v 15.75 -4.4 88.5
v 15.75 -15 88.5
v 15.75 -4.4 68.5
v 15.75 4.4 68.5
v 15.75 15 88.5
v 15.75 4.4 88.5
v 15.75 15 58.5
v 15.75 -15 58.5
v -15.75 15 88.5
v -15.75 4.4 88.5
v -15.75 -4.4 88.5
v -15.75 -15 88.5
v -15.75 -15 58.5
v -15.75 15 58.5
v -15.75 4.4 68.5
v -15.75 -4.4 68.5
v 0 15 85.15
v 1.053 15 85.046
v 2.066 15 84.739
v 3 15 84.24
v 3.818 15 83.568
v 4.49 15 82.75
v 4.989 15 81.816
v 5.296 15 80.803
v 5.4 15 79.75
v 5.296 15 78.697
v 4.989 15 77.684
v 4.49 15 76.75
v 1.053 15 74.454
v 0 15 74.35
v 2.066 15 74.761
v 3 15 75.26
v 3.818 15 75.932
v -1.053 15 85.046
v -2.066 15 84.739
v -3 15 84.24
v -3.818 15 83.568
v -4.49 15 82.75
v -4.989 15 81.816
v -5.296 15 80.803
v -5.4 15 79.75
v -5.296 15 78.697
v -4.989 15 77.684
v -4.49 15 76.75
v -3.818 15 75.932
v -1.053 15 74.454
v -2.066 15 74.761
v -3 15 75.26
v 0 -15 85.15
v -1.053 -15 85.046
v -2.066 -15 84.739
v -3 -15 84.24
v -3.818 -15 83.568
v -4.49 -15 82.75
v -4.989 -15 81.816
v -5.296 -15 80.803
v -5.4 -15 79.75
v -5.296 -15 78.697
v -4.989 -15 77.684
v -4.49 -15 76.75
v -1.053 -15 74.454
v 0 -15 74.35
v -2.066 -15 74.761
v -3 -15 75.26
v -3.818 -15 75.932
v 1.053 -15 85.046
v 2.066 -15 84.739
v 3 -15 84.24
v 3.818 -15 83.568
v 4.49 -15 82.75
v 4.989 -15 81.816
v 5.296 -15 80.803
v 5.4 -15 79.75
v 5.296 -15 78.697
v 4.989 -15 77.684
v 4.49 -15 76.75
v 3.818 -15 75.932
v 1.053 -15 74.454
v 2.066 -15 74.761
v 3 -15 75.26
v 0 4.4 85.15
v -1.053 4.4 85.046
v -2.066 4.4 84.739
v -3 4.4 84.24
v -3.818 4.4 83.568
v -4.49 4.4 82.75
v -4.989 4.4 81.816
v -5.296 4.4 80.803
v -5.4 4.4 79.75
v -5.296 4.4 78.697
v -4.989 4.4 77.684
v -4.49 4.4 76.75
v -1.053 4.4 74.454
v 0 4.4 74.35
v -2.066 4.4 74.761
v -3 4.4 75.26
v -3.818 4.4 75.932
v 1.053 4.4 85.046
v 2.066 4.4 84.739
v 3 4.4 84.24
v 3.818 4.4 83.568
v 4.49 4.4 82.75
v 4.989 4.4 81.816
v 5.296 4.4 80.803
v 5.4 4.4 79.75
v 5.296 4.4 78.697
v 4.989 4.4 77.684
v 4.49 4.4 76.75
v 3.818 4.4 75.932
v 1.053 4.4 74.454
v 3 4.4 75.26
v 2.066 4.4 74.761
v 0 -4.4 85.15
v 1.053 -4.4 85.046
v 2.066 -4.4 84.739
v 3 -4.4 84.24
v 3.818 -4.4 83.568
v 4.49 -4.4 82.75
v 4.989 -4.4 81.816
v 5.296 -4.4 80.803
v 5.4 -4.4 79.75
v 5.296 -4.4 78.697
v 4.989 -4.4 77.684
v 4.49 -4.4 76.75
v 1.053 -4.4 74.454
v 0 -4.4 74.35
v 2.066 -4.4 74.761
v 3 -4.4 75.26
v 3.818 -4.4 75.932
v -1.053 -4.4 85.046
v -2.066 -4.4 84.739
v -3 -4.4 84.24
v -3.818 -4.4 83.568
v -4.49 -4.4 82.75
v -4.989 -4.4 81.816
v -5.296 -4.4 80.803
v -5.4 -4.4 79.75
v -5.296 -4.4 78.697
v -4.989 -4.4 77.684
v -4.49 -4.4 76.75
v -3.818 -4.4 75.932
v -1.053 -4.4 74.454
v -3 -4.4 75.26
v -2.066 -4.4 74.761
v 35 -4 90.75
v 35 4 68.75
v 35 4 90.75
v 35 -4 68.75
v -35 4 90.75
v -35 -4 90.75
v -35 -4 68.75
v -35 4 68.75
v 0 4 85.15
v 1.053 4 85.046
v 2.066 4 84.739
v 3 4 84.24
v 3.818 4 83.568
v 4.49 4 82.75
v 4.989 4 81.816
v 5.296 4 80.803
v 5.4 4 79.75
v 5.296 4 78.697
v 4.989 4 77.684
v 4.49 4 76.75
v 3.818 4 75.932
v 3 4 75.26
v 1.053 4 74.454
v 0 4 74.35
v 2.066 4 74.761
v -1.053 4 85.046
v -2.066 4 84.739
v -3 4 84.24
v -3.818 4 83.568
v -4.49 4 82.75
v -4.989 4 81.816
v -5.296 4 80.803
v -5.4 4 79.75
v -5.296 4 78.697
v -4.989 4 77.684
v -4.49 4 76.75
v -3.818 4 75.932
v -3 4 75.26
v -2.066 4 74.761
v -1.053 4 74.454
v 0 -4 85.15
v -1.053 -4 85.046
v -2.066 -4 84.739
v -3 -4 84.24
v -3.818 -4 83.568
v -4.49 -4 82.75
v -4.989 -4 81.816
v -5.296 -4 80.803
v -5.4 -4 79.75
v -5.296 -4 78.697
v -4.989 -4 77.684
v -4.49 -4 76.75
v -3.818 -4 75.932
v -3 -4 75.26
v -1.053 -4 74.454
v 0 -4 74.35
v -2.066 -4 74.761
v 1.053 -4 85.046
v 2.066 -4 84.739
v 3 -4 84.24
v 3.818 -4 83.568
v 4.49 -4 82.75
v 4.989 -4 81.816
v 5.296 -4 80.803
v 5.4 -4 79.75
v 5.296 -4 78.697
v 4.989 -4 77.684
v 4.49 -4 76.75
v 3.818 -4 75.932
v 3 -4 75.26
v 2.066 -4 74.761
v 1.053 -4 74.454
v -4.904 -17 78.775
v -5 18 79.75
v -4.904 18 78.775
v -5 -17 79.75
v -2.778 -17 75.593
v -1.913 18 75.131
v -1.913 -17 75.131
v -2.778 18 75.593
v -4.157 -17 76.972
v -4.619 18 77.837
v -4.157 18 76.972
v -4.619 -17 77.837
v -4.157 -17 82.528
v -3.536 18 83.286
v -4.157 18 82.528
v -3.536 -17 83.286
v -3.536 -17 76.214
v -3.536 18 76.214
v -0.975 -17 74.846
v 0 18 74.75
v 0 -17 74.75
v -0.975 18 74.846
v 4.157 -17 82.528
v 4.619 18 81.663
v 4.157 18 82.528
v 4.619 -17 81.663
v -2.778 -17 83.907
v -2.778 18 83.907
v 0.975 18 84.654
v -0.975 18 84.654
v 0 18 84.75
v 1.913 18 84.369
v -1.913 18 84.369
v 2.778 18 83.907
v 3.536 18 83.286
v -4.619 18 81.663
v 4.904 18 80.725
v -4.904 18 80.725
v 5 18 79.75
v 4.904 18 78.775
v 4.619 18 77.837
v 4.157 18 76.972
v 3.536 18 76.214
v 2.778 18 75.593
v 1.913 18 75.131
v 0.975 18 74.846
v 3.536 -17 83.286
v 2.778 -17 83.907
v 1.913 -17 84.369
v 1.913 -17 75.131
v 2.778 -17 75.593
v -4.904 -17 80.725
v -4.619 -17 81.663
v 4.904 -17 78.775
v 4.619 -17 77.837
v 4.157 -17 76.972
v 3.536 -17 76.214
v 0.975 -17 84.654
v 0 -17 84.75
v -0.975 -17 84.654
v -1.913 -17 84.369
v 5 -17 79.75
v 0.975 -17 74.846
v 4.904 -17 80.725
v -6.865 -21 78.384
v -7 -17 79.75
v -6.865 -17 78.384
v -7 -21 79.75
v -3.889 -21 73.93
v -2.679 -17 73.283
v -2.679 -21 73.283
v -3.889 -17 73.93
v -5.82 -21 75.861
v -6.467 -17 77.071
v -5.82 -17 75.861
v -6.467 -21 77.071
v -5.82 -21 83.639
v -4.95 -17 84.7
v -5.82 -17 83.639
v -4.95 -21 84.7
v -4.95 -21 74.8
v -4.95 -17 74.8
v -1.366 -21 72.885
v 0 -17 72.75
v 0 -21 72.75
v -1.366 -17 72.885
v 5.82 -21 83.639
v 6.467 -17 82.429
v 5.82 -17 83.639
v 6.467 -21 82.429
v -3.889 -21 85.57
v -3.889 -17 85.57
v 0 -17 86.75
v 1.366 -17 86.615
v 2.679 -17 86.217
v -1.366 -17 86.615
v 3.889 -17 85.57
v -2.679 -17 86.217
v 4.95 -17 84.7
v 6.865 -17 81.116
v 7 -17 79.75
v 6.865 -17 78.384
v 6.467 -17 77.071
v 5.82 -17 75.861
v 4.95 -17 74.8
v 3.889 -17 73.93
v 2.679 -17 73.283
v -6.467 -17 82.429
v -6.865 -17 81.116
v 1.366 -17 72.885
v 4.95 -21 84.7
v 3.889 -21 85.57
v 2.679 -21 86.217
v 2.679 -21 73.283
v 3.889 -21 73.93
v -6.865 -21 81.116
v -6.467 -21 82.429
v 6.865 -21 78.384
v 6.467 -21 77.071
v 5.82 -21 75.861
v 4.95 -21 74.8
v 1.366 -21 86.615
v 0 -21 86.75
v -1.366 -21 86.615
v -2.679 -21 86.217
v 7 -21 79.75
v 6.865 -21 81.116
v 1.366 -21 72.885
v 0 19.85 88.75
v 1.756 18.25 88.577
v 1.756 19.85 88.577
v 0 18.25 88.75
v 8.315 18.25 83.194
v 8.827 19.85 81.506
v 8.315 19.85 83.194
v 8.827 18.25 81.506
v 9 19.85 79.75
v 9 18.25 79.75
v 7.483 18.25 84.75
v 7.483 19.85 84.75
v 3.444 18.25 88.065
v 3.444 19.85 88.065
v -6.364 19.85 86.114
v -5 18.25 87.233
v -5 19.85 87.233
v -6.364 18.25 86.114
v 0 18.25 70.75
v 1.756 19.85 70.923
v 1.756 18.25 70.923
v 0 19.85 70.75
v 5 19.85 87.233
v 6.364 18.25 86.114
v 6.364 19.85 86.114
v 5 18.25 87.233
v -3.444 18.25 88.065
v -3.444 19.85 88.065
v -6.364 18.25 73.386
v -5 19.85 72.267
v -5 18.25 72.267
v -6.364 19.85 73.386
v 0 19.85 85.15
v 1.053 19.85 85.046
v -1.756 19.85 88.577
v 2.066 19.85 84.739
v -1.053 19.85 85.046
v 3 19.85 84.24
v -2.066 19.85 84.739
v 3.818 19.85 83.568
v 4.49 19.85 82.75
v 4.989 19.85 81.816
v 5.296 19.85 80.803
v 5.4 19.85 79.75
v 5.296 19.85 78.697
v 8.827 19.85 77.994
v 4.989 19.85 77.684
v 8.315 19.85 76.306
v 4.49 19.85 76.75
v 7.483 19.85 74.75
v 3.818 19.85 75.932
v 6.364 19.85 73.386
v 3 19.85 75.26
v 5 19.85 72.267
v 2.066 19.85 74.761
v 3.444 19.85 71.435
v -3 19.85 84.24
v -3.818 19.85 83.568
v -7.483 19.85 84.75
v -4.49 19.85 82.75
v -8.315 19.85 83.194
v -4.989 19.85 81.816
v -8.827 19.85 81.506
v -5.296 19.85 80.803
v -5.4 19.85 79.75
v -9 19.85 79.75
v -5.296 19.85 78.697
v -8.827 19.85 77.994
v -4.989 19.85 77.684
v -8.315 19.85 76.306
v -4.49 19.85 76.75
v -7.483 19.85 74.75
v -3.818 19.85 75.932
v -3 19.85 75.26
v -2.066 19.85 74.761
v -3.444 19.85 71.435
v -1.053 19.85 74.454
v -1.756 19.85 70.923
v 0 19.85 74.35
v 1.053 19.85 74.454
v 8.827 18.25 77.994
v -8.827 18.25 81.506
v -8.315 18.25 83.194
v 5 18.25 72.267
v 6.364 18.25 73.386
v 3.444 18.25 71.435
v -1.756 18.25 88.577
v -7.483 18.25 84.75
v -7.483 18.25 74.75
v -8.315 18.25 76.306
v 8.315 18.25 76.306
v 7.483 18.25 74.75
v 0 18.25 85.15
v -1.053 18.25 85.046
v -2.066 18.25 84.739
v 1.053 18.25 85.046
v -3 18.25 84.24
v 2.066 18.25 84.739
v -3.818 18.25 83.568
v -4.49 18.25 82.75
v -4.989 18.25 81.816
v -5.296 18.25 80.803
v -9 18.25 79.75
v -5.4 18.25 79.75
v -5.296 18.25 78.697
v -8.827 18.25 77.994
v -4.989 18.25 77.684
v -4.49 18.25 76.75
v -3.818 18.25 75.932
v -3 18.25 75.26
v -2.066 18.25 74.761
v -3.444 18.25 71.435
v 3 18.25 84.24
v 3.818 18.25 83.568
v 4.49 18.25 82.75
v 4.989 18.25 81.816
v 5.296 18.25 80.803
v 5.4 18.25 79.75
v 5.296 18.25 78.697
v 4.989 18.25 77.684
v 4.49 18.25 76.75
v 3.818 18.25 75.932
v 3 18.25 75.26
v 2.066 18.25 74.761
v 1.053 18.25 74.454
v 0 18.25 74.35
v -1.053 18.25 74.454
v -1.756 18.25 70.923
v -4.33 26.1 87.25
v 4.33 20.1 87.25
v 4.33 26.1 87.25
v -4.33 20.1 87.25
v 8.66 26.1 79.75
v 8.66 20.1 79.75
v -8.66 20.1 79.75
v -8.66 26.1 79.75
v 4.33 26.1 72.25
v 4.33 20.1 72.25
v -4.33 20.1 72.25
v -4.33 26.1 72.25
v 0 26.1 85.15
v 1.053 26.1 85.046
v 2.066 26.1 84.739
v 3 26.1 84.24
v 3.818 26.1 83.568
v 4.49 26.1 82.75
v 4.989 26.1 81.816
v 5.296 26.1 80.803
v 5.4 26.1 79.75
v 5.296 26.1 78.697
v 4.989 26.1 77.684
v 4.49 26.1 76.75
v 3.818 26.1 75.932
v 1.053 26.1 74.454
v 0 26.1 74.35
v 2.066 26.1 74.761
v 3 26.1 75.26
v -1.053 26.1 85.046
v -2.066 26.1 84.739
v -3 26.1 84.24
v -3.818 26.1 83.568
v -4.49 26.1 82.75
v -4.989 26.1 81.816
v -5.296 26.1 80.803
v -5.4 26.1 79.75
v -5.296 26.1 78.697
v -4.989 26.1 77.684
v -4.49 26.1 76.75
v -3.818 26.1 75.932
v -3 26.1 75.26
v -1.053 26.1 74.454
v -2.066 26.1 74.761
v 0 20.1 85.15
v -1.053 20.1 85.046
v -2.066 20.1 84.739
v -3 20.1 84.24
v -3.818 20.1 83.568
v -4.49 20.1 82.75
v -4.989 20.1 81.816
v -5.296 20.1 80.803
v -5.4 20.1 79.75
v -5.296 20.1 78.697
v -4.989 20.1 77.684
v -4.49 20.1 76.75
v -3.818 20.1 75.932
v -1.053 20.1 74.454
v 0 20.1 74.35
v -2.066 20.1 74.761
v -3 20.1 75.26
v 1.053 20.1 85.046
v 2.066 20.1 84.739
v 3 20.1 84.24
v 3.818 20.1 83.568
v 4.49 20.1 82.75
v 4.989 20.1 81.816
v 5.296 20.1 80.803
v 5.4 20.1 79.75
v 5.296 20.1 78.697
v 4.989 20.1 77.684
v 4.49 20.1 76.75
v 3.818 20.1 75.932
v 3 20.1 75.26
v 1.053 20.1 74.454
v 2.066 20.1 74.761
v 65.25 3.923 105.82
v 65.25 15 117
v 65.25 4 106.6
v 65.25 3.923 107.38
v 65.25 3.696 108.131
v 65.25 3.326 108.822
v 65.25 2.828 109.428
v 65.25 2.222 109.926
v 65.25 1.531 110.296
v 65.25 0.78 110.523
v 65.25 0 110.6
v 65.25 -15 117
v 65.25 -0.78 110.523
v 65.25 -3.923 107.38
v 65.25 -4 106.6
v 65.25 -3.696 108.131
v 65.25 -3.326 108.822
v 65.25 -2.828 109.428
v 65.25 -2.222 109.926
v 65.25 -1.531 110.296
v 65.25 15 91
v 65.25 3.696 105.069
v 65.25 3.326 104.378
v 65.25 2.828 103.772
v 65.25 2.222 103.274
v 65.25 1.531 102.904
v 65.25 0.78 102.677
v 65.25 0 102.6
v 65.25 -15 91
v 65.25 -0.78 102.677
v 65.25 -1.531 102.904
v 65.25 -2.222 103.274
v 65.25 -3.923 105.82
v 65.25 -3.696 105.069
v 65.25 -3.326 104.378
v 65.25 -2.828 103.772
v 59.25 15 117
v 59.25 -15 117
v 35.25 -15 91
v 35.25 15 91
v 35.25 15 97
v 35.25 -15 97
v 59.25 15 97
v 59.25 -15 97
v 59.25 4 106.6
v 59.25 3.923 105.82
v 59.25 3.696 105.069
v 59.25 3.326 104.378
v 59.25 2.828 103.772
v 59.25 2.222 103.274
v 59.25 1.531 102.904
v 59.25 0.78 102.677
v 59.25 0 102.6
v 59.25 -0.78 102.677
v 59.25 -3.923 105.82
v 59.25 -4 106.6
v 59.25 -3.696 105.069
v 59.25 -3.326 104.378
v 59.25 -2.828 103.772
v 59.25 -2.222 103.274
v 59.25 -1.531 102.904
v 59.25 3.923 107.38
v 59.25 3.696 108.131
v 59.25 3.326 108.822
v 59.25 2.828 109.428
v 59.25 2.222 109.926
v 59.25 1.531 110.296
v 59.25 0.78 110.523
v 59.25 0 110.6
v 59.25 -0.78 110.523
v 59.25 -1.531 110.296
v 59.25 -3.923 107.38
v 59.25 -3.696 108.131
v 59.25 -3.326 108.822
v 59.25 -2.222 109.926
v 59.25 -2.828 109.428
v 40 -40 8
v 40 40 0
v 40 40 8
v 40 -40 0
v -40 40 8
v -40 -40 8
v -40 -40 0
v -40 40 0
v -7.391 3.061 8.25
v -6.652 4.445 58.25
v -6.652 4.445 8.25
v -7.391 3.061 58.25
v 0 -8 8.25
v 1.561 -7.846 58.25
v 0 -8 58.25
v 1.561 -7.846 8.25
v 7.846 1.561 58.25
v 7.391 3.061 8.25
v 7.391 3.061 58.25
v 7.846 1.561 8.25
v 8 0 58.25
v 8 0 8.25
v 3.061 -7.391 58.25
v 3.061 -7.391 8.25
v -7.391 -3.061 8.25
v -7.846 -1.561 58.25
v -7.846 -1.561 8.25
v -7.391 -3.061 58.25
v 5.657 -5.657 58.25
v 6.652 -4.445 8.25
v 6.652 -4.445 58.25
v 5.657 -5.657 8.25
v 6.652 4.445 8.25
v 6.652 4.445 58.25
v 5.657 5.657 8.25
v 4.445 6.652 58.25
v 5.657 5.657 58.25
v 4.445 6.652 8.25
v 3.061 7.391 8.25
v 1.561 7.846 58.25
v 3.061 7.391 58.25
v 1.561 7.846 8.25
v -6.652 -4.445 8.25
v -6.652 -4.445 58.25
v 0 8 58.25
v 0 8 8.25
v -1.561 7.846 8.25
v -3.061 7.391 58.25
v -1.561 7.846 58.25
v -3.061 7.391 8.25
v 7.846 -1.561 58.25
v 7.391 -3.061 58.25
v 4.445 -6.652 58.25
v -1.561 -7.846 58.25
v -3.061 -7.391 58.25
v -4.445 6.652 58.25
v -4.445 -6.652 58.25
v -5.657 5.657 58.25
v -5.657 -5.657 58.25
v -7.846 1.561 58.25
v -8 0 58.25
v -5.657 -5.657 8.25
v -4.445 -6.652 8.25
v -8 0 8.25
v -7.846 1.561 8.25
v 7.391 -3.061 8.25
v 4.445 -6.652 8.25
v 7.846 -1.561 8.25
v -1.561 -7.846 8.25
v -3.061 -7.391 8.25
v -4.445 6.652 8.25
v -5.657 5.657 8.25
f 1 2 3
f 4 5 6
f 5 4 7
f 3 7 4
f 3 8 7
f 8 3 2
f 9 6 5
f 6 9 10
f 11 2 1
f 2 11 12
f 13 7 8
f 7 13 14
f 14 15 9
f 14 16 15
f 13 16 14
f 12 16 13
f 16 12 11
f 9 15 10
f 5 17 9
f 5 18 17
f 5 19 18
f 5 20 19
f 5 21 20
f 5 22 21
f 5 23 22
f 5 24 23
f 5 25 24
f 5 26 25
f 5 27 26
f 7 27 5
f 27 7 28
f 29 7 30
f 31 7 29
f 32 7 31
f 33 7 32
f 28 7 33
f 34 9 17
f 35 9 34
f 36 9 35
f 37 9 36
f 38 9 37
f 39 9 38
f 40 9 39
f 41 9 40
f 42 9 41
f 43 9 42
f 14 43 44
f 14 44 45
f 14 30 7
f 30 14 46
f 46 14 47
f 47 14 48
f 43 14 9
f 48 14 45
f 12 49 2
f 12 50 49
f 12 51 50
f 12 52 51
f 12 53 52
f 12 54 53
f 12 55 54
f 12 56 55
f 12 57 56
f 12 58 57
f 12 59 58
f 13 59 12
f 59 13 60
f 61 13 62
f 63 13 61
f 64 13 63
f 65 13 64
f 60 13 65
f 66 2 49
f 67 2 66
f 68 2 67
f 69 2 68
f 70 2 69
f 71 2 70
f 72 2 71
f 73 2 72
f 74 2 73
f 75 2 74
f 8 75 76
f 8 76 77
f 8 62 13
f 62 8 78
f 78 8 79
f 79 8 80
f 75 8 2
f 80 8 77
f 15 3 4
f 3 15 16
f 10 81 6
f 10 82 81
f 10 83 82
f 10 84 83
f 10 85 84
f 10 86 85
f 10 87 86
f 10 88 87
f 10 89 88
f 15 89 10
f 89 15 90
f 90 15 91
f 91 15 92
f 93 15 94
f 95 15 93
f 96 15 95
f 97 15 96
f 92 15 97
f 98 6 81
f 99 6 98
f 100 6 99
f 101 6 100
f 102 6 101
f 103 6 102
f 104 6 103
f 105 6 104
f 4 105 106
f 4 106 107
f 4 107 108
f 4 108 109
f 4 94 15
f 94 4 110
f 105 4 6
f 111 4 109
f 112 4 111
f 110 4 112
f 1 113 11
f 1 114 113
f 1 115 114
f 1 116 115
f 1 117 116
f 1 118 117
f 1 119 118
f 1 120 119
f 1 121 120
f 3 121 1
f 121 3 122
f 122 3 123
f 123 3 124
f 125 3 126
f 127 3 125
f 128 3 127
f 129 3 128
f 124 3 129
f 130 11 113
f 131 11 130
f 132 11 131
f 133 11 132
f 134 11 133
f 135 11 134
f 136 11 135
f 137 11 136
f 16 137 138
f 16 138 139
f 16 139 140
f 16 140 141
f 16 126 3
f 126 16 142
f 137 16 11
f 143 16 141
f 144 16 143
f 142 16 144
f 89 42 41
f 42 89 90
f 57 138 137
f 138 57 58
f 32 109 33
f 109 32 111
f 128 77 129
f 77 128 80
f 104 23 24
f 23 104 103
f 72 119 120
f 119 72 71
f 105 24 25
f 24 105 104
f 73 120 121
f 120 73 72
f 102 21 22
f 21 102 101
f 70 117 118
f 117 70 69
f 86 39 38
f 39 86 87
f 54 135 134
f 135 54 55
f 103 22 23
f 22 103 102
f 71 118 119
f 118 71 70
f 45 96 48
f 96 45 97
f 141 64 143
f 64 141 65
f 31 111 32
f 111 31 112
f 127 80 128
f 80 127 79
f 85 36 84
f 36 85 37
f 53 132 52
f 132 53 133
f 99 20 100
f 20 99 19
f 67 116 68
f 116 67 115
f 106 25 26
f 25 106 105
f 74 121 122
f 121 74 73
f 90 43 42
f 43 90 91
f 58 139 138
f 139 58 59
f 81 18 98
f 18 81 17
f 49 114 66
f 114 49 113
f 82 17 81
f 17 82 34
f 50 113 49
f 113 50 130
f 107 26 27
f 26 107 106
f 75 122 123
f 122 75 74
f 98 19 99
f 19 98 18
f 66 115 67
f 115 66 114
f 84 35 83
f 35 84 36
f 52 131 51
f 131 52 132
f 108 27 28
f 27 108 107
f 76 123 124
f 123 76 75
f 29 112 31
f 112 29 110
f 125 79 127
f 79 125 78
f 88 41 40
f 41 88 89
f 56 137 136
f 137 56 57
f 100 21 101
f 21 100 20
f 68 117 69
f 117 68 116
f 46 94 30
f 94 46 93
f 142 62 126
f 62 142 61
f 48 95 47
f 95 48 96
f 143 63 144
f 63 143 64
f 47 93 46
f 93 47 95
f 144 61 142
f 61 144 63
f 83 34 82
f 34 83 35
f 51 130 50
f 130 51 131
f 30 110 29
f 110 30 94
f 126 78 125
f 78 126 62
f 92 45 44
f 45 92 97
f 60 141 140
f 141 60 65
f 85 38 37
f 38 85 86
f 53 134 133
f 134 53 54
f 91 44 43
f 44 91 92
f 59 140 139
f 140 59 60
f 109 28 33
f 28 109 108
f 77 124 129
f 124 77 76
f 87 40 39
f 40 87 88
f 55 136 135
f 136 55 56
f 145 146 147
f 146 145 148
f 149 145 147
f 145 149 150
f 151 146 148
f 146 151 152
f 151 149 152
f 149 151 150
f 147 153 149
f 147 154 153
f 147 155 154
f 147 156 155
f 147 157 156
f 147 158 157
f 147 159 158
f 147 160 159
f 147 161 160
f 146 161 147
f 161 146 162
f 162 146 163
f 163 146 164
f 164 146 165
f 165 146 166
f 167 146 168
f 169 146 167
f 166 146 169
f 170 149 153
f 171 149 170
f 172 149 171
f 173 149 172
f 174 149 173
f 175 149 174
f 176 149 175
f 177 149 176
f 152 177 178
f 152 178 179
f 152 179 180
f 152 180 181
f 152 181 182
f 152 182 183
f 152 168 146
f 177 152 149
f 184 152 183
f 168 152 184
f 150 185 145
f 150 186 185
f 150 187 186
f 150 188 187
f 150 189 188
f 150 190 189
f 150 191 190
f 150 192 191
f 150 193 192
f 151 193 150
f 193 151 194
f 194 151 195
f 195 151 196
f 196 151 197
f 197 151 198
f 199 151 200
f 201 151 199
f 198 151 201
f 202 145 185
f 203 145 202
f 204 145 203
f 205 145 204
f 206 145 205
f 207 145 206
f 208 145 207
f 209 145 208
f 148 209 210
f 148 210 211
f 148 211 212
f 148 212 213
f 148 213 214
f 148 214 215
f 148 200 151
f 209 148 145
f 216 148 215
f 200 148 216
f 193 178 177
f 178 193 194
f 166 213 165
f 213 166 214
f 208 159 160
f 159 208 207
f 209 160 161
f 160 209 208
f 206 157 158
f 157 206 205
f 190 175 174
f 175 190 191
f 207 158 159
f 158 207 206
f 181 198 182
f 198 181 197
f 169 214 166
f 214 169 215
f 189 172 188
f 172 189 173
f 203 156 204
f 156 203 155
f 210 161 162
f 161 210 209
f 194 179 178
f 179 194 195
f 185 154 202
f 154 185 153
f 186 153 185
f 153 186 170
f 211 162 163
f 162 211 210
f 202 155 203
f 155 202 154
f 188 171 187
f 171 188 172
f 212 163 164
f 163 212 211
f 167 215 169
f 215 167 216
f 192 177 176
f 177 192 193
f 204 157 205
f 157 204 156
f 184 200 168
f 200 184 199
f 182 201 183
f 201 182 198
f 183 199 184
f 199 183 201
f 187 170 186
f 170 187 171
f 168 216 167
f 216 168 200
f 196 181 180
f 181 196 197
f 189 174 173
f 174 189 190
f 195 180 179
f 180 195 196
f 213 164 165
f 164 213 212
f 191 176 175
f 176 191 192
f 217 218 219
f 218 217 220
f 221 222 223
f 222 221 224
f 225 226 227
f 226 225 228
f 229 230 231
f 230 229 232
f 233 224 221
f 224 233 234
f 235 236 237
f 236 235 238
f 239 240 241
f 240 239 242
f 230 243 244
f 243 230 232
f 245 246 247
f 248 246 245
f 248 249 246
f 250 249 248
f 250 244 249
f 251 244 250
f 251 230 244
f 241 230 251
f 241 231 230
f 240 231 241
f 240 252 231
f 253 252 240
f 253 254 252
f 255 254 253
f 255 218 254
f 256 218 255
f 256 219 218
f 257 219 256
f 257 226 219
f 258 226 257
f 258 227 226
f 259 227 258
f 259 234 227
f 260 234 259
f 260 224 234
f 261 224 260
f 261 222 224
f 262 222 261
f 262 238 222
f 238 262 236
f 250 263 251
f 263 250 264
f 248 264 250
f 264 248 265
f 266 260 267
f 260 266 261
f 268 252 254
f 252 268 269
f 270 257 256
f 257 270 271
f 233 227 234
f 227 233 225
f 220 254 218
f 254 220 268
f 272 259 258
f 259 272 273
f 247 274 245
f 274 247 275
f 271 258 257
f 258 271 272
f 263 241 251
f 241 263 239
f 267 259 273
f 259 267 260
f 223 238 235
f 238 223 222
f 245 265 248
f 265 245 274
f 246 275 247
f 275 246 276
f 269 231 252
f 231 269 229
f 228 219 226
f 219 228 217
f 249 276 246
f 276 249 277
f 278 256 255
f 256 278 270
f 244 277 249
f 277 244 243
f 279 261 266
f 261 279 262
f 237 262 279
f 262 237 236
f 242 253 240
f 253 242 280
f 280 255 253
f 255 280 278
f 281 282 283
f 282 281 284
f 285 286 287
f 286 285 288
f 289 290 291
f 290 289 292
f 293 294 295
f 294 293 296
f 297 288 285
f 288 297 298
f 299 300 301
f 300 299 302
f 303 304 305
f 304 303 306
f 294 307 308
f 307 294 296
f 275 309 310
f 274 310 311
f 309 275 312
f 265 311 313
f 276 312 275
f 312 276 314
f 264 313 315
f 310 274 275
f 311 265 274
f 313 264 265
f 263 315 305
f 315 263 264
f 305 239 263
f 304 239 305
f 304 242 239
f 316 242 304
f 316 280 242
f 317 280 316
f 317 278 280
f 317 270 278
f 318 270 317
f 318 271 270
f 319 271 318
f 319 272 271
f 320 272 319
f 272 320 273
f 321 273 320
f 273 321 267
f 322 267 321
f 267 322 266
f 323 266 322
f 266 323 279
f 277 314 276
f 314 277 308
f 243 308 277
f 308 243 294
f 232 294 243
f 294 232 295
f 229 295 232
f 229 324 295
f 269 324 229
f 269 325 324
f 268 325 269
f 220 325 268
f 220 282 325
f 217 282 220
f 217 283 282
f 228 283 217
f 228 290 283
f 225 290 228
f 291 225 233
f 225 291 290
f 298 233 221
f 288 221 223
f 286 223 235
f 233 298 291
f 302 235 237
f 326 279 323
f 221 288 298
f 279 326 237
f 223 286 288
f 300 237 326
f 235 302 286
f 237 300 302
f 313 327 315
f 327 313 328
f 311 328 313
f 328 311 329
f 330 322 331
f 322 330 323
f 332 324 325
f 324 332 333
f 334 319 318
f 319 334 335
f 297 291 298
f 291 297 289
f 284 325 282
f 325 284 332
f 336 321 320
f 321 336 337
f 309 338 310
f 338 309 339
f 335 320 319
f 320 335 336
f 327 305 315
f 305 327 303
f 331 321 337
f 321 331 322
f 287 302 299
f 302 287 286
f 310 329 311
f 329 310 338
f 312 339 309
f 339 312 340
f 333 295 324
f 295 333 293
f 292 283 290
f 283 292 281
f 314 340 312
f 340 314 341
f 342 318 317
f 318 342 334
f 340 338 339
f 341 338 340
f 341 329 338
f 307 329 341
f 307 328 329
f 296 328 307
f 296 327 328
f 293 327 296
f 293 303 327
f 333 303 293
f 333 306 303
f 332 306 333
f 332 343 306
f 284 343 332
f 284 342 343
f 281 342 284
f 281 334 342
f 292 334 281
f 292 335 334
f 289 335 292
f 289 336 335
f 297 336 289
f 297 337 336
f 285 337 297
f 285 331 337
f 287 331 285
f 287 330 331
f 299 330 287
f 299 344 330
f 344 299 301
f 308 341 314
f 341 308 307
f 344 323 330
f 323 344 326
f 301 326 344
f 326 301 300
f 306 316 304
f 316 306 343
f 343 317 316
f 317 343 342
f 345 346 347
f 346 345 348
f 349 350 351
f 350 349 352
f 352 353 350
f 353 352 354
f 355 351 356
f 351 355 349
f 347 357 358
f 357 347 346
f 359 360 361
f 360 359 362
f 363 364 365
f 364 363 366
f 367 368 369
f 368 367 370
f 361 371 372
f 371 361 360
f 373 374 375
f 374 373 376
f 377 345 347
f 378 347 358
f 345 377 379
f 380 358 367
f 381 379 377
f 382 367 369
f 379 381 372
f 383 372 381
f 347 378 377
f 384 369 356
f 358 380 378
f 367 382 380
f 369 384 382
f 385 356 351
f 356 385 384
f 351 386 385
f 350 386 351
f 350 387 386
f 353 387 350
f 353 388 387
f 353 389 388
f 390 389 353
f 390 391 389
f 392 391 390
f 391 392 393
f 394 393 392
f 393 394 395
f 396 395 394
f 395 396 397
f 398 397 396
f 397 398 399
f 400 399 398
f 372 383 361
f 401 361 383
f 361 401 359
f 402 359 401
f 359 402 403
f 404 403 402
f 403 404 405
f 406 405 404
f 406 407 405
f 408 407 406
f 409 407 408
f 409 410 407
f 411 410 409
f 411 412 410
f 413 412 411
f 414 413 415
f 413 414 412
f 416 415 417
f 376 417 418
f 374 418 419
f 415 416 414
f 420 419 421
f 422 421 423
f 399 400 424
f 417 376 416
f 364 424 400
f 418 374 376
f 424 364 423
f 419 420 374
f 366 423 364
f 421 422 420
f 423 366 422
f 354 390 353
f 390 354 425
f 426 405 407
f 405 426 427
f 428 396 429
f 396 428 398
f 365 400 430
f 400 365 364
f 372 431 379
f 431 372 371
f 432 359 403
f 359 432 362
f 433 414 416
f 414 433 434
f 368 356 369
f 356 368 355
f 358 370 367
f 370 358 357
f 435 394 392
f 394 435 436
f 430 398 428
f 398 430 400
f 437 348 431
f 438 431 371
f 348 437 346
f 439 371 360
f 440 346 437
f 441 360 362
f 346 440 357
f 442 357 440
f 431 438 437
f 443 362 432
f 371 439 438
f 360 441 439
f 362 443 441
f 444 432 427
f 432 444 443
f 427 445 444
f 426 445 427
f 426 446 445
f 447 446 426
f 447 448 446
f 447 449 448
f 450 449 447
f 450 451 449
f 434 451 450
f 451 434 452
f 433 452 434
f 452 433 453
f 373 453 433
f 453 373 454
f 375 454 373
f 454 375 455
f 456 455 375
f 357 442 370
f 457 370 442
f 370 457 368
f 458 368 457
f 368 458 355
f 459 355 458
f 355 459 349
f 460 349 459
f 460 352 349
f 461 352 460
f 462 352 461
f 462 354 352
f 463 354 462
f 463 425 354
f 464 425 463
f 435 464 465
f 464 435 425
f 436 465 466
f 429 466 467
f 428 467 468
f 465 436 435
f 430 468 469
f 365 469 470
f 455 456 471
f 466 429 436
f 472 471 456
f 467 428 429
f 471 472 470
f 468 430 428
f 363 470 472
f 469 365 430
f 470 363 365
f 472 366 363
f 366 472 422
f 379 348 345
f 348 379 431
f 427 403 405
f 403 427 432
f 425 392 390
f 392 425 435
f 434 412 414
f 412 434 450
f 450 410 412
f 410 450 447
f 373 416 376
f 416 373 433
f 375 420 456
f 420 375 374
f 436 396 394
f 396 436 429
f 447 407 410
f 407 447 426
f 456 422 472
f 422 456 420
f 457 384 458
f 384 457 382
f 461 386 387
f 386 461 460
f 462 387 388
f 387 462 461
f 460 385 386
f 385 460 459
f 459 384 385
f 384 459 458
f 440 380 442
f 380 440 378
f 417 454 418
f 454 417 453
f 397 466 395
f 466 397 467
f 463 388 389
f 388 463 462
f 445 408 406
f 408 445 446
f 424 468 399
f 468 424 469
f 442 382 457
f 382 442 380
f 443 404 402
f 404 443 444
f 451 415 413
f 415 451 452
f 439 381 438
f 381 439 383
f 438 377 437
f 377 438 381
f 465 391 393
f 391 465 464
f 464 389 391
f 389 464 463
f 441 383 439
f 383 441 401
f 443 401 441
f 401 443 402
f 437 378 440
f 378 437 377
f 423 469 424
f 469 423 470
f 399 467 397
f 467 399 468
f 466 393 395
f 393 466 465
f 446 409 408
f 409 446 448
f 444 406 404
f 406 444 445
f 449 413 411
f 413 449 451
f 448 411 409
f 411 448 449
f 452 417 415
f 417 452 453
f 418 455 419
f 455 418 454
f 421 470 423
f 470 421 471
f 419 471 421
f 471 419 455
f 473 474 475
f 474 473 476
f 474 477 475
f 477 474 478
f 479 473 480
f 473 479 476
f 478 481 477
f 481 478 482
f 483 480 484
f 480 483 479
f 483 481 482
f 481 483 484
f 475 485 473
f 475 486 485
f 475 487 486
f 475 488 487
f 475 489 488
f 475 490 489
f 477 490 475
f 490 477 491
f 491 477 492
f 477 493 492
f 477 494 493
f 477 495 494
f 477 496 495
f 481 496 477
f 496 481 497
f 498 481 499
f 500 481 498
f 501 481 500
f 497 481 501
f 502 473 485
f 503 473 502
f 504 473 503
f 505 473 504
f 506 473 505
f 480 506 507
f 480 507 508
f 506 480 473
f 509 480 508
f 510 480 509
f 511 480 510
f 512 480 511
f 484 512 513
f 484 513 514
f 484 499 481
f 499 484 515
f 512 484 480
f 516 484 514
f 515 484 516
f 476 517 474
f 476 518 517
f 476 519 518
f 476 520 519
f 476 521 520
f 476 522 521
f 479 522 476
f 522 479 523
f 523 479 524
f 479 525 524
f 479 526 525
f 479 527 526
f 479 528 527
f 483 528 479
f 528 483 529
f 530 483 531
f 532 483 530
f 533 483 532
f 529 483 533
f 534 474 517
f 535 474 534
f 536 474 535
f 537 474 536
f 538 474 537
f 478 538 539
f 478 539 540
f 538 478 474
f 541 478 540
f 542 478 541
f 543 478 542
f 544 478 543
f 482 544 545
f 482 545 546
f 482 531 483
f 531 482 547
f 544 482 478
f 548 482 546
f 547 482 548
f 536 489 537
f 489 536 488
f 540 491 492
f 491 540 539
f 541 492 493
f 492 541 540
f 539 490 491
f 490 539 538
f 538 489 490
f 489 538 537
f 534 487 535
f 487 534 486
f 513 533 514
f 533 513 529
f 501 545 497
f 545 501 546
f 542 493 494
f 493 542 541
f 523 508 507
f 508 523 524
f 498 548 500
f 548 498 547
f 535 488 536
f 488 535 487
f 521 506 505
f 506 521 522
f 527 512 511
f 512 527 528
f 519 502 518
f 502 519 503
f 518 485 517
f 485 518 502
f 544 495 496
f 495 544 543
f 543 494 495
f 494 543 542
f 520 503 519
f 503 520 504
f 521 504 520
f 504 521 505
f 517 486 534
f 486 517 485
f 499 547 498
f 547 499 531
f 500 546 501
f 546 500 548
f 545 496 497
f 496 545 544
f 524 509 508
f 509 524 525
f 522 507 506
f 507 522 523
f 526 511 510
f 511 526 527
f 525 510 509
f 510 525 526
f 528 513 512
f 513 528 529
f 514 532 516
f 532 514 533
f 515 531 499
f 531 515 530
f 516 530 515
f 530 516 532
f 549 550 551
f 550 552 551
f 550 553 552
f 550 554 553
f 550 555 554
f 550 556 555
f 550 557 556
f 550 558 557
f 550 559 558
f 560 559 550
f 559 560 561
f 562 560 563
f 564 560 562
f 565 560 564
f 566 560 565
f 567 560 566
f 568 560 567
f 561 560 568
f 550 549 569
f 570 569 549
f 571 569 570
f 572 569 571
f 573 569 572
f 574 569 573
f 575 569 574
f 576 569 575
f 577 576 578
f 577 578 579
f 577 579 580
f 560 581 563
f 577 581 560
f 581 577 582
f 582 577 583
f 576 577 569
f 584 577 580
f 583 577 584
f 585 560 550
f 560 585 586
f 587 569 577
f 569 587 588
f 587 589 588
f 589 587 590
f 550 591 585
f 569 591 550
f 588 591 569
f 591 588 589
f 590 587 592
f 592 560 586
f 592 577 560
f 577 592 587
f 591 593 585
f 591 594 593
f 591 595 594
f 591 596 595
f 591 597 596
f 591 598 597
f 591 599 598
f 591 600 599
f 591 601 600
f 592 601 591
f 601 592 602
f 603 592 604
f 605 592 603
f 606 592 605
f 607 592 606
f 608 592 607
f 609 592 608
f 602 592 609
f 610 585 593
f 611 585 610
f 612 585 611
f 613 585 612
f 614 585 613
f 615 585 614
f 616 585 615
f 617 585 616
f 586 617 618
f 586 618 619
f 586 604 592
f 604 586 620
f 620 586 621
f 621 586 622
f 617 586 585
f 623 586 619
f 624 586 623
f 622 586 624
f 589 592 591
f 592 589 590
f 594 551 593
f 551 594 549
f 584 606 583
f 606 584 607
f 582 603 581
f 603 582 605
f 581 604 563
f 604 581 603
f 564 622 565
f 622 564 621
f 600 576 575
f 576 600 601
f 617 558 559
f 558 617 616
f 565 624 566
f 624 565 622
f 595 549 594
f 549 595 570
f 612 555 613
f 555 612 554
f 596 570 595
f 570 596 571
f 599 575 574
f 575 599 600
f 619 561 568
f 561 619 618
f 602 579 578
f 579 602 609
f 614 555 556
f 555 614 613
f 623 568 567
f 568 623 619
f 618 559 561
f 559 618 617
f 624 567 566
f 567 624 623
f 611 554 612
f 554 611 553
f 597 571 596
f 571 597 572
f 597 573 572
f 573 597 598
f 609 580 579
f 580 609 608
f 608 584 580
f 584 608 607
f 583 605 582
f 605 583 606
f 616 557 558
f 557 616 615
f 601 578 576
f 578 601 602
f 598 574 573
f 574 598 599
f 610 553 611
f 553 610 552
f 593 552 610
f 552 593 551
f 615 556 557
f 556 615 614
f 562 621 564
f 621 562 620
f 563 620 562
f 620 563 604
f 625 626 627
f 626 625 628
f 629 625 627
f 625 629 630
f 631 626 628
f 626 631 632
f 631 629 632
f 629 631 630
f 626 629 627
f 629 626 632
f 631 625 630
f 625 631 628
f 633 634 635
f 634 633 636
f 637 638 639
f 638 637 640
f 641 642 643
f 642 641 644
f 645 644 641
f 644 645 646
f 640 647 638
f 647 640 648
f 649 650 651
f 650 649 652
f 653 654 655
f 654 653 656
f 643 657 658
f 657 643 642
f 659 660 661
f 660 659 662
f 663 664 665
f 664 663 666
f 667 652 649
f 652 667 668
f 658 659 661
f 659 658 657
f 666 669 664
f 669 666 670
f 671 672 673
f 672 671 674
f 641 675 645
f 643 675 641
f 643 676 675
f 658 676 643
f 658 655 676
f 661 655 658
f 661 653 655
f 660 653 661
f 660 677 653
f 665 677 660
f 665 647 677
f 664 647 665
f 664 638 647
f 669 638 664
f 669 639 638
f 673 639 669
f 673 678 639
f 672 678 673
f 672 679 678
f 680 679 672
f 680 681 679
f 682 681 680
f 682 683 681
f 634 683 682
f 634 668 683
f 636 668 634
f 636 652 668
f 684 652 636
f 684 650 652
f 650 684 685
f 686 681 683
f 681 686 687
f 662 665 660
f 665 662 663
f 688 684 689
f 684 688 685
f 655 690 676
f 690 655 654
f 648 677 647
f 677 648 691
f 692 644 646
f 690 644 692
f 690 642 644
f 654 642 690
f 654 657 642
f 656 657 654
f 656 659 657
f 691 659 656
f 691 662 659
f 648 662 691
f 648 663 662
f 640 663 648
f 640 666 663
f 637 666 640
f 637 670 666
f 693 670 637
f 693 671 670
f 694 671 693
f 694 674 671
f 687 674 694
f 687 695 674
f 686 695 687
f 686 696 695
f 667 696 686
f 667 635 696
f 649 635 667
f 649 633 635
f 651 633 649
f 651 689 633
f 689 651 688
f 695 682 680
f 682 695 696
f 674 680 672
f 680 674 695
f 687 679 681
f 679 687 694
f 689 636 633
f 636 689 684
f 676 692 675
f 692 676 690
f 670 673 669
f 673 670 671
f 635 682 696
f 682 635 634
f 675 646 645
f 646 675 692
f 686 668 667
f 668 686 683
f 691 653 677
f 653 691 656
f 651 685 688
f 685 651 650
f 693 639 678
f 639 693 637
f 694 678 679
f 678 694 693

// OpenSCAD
$fn = 32;

// ------------------------------------------------------------------------
// Lamp arm: column d16 x 50 mm, arm 70 mm
// Every part is its own module, assembly() places every instance.
// ------------------------------------------------------------------------

// --- part 1 ---
module lamp_base() {
  difference() {
    translate([-40, -40, 0]) cube([80, 80, 8]);
  }
}

// --- part 2 ---
module lamp_column() {
  cylinder(h = 50, d = 16);
}

// --- part 3 ---
module head_fork() {
  difference() {
    translate([-15.75, -15, 0]) cube([31.5, 30, 30]);
    translate([-16.75, -4.4, 10]) cube([33.5, 8.8, 21]);
    translate([0, 0, 21.25]) rotate([90, 0, 0]) cylinder(h = 32, d = 10.8, center = true);
  }
}

// --- part 4 ---
module lamp_arm() {
  difference() {
    translate([-35, -4, 0]) cube([70, 8, 22]);
    translate([0, 0, 11]) rotate([90, 0, 0]) cylinder(h = 10, d = 10.8, center = true);
  }
}

// --- part 5 ---
module arm_pin() {
  rotate([0, 90, 0]) cylinder(h = 36, d = 10, center = true);
  translate([-21, 0, 0]) rotate([0, 90, 0]) cylinder(h = 4, d = 14);
}

// --- part 6 ---
module arm_washer() {
  difference() {
      translate([0, 0, 0]) cylinder(h = 1.6, d = 18);
      translate([0, 0, -1]) cylinder(h = 3.6, d = 10.8);
    }
}

// --- part 7 ---
module arm_nut() {
  difference() {
    linear_extrude(height = 6) polygon(points = [[8.66, 0], [4.33, 7.5], [-4.33, 7.5], [-8.66, 0], [-4.33, -7.5], [4.33, -7.5]]);
    translate([0, 0, -1]) cylinder(h = 8, d = 10.8);
  }
}

// --- part 8 ---
module shade_bracket() {
  difference() {
    translate([-15, -15, 0]) cube([30, 30, 26]);
    translate([-16, -16, 6]) cube([25, 32, 21]);
    translate([12, 0, 15.6]) rotate([0, 90, 0]) cylinder(h = 8, d = 8, center = true);
  }
}

// --- assembly ---
module assembly() {
  color([0.80, 0.24, 0.20]) translate([0, 0, 0]) rotate([0, 0, 0]) lamp_base();
  color([0.20, 0.45, 0.75]) translate([0, 0, 8.25]) rotate([0, 0, 0]) lamp_column();
  color([0.25, 0.62, 0.32]) translate([0, 0, 58.5]) rotate([0, 0, 0]) head_fork();
  color([0.92, 0.70, 0.18]) translate([0, 0, 68.75]) rotate([0, 0, 0]) lamp_arm();
  color([0.58, 0.35, 0.70]) translate([0, 0, 79.75]) rotate([0, 0, 90]) arm_pin();
  color([0.16, 0.66, 0.66]) translate([0, 19.85, 79.75]) rotate([90, 0, 0]) arm_washer();
  color([0.85, 0.48, 0.18]) translate([0, 26.1, 79.75]) rotate([90, 0, 0]) arm_nut();
  color([0.55, 0.60, 0.65]) translate([50.25, 0, 91]) rotate([0, 0, 0]) shade_bracket();
}

assembly();
